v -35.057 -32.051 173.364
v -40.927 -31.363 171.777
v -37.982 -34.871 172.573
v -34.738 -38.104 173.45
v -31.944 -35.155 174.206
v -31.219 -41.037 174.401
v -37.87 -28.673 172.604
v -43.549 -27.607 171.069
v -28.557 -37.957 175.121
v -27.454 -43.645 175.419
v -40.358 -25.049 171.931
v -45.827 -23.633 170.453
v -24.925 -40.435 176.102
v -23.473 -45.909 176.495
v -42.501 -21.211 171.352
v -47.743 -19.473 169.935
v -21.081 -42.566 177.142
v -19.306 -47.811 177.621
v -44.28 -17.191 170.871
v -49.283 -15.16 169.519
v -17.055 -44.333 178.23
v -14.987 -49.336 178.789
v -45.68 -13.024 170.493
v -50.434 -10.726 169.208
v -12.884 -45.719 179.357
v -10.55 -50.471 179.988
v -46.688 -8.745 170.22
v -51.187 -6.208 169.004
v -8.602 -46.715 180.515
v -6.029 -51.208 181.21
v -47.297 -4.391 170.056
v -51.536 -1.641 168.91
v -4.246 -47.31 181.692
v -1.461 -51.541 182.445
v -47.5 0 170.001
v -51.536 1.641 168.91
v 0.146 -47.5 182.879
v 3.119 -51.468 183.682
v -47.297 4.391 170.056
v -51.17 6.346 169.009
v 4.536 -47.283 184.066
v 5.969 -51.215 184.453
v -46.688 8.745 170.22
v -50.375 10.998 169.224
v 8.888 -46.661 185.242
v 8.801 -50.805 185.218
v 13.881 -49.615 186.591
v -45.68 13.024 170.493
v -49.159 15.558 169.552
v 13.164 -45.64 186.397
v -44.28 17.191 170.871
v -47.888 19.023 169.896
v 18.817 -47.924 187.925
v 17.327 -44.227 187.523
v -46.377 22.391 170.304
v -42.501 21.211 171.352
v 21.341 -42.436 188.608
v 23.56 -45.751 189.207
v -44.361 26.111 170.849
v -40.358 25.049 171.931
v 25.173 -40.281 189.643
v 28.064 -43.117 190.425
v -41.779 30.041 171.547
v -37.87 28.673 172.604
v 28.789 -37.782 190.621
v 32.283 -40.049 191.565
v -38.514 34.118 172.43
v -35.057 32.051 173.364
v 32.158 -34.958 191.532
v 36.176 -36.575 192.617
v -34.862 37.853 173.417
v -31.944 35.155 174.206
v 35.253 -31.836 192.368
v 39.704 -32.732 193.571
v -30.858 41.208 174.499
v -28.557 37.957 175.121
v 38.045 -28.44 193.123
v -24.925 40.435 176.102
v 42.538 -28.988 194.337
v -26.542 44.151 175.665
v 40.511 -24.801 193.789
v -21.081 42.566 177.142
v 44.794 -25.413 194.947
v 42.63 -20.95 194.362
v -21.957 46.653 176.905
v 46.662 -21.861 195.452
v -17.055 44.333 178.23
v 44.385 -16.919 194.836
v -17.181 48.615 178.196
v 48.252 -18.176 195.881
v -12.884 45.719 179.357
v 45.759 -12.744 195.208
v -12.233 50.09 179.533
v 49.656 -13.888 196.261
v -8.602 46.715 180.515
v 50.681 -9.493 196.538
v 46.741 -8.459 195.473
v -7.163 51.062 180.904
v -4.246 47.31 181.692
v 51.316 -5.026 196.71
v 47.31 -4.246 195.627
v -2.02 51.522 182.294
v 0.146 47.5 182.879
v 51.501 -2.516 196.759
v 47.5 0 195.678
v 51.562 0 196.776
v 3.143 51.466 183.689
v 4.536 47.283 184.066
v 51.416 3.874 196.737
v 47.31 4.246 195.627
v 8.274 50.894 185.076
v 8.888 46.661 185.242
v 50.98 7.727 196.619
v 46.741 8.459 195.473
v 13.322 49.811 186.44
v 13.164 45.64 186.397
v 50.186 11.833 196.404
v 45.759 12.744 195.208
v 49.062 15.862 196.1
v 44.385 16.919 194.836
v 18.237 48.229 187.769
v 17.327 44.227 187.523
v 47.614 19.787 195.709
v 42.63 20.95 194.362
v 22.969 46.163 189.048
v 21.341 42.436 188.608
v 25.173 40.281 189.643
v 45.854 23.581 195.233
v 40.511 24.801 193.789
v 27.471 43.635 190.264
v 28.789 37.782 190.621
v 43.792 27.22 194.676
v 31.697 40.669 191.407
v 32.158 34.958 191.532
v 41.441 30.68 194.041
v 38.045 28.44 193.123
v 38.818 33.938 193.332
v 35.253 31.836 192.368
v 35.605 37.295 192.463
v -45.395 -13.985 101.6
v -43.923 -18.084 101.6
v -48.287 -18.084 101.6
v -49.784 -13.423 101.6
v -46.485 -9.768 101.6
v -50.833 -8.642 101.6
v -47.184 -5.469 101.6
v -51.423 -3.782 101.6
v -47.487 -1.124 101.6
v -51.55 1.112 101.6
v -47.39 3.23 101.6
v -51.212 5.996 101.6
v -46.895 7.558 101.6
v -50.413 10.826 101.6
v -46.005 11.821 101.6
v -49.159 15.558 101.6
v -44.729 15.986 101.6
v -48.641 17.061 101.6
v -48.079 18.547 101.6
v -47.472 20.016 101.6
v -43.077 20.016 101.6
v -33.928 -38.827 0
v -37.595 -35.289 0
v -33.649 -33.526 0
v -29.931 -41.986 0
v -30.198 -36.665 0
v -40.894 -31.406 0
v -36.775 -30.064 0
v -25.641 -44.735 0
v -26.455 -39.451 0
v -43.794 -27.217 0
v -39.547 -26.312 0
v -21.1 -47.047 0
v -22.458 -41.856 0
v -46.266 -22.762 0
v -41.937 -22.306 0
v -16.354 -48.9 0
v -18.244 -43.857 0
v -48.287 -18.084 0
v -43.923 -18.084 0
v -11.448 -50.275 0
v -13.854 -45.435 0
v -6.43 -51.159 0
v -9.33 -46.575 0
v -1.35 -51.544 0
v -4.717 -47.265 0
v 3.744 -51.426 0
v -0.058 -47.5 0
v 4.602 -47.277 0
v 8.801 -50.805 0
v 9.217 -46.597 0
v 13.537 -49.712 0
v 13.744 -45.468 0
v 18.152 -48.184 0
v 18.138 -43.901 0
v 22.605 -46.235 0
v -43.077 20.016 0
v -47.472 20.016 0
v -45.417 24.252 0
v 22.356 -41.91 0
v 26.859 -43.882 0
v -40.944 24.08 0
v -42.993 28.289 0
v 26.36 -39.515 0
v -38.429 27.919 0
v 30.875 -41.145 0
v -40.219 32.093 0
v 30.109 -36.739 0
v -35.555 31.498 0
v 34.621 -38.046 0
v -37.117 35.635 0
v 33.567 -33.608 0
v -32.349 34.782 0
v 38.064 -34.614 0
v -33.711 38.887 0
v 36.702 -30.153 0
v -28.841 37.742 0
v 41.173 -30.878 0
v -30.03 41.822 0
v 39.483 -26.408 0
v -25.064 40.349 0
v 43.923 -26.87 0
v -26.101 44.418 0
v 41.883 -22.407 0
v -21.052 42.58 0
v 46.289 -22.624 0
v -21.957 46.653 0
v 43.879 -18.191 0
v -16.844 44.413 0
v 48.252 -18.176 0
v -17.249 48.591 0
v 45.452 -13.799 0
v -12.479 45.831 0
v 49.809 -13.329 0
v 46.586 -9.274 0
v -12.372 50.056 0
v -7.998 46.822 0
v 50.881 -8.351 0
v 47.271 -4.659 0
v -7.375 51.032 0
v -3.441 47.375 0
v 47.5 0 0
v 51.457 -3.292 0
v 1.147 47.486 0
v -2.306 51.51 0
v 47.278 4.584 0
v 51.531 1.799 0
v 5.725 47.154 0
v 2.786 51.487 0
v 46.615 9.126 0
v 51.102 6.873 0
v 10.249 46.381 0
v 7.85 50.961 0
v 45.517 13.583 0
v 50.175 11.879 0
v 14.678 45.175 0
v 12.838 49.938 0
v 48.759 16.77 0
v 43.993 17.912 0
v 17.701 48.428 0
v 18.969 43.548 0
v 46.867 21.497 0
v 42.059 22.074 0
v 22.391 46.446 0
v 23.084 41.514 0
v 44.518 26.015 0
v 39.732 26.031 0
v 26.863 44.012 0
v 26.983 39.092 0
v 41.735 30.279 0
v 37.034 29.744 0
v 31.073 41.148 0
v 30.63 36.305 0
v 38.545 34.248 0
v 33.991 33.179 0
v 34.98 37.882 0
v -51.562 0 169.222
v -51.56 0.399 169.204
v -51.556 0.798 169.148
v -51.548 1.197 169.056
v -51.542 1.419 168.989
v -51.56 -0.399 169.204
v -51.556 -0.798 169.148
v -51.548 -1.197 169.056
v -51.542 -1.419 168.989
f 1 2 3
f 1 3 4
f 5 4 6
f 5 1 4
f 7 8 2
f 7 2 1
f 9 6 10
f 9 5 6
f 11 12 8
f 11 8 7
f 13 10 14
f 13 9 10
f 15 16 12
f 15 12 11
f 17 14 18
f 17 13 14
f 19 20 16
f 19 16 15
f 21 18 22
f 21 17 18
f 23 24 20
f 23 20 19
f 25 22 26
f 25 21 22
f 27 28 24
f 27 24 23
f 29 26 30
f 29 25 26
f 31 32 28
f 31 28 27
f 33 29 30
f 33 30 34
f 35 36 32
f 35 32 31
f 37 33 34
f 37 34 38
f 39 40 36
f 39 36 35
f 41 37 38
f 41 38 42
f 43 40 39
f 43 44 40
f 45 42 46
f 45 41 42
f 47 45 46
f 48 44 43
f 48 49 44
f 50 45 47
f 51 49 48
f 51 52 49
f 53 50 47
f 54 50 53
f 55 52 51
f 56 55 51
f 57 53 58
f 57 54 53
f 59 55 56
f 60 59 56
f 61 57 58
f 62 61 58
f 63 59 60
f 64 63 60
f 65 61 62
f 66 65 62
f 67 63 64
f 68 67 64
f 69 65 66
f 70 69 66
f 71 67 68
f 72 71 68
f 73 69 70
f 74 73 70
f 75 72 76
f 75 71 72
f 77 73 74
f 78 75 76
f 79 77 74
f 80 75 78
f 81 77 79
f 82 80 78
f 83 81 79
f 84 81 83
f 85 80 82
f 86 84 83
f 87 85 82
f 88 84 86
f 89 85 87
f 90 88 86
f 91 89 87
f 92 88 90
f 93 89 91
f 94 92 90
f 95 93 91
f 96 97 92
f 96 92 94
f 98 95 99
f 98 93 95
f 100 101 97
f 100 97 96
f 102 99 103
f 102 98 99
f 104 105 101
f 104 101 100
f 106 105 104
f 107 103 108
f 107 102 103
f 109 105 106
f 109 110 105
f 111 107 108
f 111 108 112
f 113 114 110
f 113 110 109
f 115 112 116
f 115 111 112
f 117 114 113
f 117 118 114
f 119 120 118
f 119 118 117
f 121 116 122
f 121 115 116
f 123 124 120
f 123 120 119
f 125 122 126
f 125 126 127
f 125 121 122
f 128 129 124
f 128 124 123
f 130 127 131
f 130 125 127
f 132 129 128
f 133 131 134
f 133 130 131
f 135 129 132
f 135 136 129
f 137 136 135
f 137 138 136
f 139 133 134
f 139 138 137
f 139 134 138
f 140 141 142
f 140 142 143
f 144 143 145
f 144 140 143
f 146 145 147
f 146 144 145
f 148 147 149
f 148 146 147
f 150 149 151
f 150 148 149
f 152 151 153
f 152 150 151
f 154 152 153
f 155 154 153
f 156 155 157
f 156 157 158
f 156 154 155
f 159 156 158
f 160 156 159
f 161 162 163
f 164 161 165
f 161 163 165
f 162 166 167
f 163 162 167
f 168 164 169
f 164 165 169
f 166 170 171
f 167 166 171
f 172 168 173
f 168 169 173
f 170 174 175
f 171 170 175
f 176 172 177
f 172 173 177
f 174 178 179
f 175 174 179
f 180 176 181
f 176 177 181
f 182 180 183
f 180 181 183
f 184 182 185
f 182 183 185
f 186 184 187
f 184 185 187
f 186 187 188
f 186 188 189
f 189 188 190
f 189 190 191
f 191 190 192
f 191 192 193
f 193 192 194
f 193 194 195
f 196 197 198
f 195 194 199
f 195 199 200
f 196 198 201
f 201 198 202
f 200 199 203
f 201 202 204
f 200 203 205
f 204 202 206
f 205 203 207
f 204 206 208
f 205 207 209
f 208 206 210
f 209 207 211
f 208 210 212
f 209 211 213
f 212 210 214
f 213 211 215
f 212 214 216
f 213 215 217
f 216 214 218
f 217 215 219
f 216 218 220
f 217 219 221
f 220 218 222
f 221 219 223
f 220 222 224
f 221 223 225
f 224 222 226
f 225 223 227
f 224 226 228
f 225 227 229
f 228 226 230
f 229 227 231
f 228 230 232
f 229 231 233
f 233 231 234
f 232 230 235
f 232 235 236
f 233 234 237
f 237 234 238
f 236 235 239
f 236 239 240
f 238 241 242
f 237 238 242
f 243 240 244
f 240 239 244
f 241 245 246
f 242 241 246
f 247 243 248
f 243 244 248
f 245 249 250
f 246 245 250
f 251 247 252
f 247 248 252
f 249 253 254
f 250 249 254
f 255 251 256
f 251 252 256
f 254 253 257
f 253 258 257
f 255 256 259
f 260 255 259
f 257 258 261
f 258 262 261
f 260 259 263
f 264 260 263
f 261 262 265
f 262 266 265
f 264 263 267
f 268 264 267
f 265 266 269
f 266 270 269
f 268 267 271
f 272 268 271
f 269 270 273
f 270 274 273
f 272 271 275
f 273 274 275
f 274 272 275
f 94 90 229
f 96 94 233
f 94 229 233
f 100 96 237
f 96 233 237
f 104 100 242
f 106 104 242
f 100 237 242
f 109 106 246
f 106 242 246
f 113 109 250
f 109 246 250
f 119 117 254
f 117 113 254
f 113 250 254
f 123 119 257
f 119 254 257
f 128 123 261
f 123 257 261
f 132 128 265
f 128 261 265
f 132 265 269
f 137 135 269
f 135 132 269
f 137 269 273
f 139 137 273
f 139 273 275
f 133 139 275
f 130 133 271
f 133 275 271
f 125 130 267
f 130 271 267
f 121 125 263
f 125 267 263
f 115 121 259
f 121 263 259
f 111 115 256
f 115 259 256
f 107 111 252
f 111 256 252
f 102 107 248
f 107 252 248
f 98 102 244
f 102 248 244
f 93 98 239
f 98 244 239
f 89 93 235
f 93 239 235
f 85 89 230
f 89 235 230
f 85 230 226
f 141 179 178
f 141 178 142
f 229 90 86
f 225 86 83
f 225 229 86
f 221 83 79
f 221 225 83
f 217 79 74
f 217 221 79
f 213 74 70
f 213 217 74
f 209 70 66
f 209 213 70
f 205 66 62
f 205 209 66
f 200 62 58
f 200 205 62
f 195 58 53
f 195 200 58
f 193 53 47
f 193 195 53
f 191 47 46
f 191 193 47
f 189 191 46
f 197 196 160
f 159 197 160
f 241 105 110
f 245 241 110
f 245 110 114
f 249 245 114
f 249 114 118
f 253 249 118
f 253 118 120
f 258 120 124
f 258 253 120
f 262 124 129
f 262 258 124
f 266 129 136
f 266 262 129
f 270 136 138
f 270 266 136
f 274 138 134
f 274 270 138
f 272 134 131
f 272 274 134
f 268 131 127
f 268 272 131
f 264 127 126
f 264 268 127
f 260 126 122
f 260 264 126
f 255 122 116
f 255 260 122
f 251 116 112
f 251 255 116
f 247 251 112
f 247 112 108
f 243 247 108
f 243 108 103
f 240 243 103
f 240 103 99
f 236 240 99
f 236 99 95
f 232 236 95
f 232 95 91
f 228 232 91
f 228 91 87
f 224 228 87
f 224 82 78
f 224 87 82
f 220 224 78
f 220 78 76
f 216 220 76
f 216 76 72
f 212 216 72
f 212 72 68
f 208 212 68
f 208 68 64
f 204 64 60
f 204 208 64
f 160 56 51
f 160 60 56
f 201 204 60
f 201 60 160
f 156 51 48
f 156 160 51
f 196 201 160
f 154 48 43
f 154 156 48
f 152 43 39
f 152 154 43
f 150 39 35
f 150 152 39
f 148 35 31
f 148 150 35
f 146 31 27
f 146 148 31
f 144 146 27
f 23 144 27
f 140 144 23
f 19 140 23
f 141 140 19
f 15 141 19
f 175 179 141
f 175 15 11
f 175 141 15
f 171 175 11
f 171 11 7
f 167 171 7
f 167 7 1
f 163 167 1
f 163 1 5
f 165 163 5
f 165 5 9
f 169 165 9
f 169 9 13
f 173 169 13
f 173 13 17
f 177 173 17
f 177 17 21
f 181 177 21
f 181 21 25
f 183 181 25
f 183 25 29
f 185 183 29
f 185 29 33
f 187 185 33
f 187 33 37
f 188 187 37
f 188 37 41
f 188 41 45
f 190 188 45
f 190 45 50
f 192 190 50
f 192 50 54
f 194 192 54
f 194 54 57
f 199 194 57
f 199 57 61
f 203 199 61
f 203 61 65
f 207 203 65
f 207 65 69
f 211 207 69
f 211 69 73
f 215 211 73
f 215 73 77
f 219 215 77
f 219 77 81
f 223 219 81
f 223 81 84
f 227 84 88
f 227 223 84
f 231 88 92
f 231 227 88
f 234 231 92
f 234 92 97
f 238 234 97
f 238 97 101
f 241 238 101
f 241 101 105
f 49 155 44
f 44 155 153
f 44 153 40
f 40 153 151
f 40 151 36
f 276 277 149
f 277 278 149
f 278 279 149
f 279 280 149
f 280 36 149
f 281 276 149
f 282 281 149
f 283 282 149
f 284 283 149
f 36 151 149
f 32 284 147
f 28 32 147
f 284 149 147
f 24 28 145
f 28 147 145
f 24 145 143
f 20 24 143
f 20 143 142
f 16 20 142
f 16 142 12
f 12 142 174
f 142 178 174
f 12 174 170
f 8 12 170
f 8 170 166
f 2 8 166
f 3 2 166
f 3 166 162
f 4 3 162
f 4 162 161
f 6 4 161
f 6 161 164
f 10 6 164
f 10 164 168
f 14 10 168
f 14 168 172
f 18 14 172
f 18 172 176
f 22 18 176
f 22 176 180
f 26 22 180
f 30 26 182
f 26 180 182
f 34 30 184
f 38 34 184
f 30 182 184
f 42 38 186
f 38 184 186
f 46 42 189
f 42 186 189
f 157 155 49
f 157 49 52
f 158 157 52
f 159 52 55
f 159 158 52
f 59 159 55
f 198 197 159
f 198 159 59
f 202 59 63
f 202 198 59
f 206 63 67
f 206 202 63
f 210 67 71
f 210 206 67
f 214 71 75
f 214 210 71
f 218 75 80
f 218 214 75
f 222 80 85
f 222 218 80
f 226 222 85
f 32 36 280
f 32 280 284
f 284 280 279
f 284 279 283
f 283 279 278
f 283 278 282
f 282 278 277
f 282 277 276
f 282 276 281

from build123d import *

# Parameters (mm, degrees)
F0_R          = 51.562
F0_R_2        = 47.5
F1_DEPTH      = 196.85
F3_DEPTH      = 61
F3_DEPTH_BACK = 74
F4_W          = 38.1
F4_H          = 101.6
F5_DEPTH      = 61
F7_DEPTH      = 222


with BuildPart() as f1:
    # F0 (on Top) → F1 (new body)
    with BuildSketch(Plane.XY):
        Circle(F0_R)
        Circle(F0_R_2, mode=Mode.SUBTRACT)
    extrude(amount=F1_DEPTH)

    # F2 (on Front) → F3 (cut, two sides)
    with BuildSketch(Plane.XZ) as f3_sk:
        Polygon((-53.913258, 197.321147), (-51.535871, 168.91), (53.578619, 197.321147), align=None)
    extrude(amount=F3_DEPTH, mode=Mode.SUBTRACT)
    extrude(f3_sk.sketch, amount=-F3_DEPTH_BACK, mode=Mode.SUBTRACT)

    # F4 (on Right) → F5 (cut)
    with BuildSketch(Plane.YZ):
        with Locations((0.965748, 50.8)):
            Rectangle(F4_W, F4_H)
    extrude(amount=-F5_DEPTH, mode=Mode.SUBTRACT)

    # F6 (on Top) → F7 (cut)
    with BuildSketch(Plane.XY):
        Polygon((-55.258796, 55.121914), (-55.258796, 0), (-55.258796, -56.109432), (54.045163, -56.109432), (54.045163, 51.900145), align=None)
        with BuildLine():
            ThreePointArc((-51.776279, 0), (-36.366122, 36.403048), (0, 51.900145))
            ThreePointArc((0, 51.900145), (36.452456, 36.489178), (51.776271, 0))
            ThreePointArc((51.776271, 0), (36.394792, -36.358057), (0, -51.652413))
            ThreePointArc((0, -51.652413), (-36.488721, -36.452209), (-51.776279, 0))
        make_face(mode=Mode.SUBTRACT)
    extrude(amount=F7_DEPTH, mode=Mode.SUBTRACT)


solid = f1.part
